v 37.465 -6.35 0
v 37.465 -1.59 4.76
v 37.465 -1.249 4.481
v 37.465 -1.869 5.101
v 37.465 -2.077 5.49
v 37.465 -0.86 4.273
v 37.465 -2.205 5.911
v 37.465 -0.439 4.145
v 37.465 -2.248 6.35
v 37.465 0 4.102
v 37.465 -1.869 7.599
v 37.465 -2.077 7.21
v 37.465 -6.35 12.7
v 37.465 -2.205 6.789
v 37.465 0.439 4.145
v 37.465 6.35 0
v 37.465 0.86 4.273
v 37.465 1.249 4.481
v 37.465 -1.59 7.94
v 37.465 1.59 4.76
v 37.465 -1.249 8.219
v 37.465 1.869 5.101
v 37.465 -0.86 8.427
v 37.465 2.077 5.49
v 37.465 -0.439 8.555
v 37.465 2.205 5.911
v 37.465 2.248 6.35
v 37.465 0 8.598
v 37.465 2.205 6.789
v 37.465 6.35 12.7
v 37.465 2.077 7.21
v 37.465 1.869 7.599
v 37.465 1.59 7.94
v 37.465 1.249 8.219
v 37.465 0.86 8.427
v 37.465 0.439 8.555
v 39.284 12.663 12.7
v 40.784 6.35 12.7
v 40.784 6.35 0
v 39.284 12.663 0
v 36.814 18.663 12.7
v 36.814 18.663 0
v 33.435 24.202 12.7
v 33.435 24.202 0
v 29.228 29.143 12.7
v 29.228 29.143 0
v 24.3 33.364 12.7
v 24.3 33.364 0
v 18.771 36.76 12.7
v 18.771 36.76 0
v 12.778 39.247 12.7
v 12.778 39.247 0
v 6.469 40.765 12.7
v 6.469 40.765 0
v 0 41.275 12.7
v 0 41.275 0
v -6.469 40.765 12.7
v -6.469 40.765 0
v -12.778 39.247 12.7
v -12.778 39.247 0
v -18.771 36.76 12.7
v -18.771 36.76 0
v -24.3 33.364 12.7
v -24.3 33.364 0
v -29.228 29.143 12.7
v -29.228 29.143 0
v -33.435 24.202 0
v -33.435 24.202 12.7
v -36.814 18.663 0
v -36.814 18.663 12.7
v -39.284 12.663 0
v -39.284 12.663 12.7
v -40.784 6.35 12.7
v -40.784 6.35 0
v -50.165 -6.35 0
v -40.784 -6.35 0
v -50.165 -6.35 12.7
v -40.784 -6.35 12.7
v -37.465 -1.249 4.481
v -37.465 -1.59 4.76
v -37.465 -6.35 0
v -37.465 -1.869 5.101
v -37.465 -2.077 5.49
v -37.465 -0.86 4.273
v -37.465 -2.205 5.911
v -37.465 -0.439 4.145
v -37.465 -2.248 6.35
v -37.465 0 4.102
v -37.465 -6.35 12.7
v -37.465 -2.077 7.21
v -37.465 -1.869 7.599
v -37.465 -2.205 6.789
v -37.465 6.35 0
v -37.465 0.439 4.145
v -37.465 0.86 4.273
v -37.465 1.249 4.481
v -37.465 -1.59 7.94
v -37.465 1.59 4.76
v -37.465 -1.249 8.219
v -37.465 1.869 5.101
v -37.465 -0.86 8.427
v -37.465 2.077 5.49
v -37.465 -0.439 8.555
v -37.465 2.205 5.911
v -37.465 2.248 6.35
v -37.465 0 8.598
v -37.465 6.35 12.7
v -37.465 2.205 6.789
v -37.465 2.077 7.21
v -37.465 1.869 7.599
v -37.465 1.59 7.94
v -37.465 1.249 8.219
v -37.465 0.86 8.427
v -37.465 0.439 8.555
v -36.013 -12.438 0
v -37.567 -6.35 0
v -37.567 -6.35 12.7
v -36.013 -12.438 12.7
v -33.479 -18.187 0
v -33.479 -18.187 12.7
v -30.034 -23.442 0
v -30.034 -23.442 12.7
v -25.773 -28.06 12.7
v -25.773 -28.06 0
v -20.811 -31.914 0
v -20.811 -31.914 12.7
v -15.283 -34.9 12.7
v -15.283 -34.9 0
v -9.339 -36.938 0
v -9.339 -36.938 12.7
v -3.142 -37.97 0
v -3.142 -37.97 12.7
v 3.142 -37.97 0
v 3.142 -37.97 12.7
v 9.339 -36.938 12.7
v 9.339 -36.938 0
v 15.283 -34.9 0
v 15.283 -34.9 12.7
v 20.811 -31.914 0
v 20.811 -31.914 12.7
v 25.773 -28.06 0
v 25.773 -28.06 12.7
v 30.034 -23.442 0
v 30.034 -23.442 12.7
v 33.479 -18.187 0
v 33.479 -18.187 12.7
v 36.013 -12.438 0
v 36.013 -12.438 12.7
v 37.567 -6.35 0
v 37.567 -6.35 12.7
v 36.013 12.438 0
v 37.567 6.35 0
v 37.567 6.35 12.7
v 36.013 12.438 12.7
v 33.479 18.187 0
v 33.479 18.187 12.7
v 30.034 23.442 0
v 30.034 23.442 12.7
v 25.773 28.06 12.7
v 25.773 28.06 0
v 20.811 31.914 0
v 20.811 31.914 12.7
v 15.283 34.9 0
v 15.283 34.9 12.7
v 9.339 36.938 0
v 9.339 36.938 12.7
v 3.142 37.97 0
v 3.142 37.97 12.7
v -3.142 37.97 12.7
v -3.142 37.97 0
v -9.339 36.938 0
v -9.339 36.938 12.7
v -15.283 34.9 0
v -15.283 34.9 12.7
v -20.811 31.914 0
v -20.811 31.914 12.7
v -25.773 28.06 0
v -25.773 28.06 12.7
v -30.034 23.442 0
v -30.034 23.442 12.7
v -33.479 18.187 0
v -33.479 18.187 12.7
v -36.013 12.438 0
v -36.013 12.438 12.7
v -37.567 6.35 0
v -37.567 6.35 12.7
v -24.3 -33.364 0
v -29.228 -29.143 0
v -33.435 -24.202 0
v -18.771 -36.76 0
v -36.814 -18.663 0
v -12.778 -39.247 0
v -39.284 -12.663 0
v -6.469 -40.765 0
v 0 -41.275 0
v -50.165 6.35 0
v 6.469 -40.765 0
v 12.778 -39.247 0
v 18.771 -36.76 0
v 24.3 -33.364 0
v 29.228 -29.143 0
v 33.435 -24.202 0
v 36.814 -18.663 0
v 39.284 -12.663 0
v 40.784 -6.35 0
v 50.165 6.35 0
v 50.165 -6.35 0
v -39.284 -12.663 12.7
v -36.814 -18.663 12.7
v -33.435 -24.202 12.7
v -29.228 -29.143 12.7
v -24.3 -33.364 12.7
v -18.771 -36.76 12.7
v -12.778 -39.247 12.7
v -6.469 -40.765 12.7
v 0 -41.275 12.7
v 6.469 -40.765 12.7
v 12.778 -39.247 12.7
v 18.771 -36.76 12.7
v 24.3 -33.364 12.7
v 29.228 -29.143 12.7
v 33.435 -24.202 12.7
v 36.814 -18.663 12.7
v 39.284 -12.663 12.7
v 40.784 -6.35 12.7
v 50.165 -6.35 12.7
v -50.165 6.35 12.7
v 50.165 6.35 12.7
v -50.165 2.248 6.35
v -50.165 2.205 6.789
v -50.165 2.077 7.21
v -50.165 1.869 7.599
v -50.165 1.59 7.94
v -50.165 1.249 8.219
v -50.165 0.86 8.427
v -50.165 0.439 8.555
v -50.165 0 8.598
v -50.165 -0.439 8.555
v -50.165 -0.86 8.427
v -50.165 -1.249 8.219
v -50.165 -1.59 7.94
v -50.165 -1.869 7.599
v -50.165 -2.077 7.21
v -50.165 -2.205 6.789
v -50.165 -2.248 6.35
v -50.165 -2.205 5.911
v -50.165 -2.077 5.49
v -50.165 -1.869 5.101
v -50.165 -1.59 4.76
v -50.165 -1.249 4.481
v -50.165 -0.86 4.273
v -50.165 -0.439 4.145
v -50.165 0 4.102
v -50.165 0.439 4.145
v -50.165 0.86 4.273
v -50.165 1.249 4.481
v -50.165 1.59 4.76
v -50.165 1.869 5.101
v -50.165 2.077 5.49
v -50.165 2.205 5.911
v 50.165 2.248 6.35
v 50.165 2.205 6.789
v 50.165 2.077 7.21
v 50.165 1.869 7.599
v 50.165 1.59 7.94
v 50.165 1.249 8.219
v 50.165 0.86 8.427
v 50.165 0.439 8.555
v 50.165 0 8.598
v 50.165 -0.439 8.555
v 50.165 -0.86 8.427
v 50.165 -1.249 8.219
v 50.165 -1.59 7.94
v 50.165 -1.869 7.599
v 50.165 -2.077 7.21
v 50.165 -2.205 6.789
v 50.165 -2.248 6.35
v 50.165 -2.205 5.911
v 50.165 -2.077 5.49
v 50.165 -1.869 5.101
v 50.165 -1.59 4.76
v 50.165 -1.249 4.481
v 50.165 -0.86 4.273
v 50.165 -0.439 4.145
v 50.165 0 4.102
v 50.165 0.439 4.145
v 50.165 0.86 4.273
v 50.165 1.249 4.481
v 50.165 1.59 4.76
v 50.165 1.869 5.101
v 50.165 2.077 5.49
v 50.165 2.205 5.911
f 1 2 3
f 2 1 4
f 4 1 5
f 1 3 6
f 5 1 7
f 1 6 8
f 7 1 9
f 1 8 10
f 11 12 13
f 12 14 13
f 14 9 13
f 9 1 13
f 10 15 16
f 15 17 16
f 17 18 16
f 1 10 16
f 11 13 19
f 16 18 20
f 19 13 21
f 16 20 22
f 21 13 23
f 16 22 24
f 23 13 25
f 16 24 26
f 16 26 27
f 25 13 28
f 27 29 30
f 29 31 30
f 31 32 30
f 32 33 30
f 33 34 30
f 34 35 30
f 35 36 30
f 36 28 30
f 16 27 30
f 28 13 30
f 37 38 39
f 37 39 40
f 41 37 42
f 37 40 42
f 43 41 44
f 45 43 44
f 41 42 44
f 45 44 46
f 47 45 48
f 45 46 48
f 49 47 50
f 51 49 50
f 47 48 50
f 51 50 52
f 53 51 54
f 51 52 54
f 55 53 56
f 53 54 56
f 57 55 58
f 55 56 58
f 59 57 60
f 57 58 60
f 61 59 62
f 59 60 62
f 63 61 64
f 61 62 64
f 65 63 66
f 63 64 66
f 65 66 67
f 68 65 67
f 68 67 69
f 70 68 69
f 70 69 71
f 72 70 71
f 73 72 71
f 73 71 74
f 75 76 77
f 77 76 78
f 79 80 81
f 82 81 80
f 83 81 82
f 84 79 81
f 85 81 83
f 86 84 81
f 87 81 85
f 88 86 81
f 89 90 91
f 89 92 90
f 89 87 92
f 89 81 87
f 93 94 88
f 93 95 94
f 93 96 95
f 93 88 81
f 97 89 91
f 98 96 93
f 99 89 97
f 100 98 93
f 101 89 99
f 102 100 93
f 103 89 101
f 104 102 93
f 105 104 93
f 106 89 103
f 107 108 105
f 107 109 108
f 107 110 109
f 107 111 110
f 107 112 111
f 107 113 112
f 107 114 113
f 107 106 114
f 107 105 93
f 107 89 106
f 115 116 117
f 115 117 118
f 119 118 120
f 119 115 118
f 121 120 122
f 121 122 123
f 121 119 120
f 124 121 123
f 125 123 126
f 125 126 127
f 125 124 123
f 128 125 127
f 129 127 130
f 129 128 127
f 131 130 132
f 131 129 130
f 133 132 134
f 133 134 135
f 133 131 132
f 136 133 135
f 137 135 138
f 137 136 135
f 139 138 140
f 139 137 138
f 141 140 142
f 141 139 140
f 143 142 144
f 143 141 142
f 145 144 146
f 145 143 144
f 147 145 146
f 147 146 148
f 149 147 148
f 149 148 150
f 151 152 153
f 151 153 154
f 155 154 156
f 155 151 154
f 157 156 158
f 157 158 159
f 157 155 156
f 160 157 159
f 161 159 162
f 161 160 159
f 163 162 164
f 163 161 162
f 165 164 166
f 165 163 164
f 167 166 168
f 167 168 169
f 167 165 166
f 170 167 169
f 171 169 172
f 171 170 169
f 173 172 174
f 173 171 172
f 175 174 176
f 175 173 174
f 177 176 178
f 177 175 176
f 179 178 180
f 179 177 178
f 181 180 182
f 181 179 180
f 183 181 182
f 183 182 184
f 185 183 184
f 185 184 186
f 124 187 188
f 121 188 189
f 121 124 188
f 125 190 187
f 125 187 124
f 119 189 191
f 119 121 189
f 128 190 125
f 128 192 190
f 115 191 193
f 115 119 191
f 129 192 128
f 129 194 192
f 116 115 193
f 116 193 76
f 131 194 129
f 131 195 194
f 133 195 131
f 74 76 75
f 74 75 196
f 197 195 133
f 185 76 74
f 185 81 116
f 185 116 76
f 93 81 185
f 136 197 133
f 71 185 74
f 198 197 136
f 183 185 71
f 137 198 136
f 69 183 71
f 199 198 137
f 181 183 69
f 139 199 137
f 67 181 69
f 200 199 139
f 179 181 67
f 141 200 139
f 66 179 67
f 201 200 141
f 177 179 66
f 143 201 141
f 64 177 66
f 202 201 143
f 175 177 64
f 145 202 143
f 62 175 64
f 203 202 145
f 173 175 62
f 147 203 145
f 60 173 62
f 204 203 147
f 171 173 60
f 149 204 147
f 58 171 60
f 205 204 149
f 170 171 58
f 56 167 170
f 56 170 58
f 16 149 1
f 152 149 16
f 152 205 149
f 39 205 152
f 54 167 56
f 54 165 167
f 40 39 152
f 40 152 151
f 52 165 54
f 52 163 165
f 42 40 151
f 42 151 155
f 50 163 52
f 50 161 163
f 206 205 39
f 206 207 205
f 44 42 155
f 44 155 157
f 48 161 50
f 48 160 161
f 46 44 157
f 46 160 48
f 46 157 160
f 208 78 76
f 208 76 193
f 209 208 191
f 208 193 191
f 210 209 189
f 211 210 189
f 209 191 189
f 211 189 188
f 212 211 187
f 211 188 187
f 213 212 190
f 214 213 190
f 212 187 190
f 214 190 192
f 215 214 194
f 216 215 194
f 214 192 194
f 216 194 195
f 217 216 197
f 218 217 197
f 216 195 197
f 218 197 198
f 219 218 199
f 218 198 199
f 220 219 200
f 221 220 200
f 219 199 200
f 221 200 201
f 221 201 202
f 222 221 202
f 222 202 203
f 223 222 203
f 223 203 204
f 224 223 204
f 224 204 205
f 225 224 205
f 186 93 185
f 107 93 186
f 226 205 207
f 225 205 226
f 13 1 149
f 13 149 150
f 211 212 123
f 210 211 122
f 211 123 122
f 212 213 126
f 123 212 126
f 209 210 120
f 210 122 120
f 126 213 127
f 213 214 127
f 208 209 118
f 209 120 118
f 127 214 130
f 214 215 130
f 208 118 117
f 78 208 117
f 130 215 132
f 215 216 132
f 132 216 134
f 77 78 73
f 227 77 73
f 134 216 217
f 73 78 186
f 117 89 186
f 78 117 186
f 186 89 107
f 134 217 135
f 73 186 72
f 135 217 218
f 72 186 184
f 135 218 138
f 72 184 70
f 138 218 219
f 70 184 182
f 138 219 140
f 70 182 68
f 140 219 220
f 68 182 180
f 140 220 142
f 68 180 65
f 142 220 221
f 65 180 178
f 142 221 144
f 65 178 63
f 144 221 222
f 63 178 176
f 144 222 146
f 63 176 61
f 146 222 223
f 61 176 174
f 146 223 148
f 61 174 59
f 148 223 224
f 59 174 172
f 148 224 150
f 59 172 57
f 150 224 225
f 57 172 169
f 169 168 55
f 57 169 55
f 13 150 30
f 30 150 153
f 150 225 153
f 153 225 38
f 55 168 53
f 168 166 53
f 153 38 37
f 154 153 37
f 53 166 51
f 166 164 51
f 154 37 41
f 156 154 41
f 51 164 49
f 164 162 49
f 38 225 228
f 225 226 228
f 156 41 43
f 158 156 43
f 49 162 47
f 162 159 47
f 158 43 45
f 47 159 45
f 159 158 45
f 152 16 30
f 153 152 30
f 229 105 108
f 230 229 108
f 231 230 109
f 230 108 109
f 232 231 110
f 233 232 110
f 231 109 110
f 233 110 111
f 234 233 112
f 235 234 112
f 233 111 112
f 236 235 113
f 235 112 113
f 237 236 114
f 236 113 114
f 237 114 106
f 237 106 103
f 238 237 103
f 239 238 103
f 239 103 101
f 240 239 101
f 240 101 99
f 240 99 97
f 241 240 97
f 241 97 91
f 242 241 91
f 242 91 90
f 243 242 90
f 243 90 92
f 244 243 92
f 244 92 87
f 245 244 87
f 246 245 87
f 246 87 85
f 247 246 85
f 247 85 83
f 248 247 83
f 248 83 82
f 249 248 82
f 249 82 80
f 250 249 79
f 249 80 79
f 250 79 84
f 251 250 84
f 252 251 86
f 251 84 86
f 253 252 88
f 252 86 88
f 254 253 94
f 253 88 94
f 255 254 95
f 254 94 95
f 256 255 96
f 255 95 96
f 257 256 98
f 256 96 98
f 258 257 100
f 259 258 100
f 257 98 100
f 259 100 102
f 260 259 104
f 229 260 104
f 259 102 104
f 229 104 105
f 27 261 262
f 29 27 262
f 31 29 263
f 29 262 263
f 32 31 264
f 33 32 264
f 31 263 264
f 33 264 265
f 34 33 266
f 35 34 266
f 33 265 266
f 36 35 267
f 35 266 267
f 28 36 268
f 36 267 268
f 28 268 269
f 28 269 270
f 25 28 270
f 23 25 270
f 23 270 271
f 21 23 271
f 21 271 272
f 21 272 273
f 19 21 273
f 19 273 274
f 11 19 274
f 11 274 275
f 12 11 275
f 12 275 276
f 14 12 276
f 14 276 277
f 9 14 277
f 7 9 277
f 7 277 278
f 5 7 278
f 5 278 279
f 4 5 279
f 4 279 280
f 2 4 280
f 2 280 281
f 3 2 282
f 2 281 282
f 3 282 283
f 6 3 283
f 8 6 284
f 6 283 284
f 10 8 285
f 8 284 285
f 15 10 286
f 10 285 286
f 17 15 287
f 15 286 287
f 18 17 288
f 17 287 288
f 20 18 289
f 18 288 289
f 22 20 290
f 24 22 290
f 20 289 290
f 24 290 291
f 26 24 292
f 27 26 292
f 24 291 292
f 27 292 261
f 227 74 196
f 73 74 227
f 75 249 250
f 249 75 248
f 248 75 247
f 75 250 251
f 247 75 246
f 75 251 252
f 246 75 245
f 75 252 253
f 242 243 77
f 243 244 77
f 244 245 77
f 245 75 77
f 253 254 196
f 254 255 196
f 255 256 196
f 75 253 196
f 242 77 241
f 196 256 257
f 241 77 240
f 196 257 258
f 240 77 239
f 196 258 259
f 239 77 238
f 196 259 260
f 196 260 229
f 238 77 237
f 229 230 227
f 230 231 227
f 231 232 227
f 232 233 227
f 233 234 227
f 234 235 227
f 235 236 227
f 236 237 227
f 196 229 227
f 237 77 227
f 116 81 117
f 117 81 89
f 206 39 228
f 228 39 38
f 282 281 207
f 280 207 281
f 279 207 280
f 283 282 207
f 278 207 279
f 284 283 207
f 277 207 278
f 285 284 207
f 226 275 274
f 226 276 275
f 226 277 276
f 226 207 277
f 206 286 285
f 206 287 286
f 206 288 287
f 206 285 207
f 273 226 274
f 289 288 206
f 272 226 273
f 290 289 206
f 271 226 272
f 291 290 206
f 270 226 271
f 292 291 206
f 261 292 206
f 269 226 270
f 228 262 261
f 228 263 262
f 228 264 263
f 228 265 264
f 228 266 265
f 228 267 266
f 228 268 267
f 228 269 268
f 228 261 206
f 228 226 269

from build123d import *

# Parameters (mm, degrees)
F0_R     = 41.275
F0_R_2   = 38.1
F1_DEPTH = 12.7
F3_W     = 12.7
F3_H     = 12.7
F4_DEPTH = 12.7
F6_W     = 12.7
F6_H     = 12.7
F7_DEPTH = 12.7
F9_D     = 4.4958


with BuildPart() as f1:
    # F0 (on Top) → F1 (new body)
    with BuildSketch(Plane.XY):
        Circle(F0_R)
        Circle(F0_R_2, mode=Mode.SUBTRACT)
    extrude(amount=F1_DEPTH)

    # F3 (on offset) → F4 (join)
    with BuildSketch(Plane.YZ.offset(37.465)):
        with Locations((0, 6.35)):
            Rectangle(F3_W, F3_H)
    extrude(amount=F4_DEPTH)

    # F6 (on offset) → F7 (join)
    with BuildSketch(Plane.YZ.offset(-37.465)):
        with Locations((0, 6.35)):
            Rectangle(F6_W, F6_H)
    extrude(amount=-F7_DEPTH)

    # F9 (through all)
    with Locations(Plane(origin=(-50.165, 0, 0), x_dir=(0, -1, 0), z_dir=(-1, 0, 0))):
        with Locations((0, 6.35)):
            Hole(F9_D / 2)


solid = f1.part
